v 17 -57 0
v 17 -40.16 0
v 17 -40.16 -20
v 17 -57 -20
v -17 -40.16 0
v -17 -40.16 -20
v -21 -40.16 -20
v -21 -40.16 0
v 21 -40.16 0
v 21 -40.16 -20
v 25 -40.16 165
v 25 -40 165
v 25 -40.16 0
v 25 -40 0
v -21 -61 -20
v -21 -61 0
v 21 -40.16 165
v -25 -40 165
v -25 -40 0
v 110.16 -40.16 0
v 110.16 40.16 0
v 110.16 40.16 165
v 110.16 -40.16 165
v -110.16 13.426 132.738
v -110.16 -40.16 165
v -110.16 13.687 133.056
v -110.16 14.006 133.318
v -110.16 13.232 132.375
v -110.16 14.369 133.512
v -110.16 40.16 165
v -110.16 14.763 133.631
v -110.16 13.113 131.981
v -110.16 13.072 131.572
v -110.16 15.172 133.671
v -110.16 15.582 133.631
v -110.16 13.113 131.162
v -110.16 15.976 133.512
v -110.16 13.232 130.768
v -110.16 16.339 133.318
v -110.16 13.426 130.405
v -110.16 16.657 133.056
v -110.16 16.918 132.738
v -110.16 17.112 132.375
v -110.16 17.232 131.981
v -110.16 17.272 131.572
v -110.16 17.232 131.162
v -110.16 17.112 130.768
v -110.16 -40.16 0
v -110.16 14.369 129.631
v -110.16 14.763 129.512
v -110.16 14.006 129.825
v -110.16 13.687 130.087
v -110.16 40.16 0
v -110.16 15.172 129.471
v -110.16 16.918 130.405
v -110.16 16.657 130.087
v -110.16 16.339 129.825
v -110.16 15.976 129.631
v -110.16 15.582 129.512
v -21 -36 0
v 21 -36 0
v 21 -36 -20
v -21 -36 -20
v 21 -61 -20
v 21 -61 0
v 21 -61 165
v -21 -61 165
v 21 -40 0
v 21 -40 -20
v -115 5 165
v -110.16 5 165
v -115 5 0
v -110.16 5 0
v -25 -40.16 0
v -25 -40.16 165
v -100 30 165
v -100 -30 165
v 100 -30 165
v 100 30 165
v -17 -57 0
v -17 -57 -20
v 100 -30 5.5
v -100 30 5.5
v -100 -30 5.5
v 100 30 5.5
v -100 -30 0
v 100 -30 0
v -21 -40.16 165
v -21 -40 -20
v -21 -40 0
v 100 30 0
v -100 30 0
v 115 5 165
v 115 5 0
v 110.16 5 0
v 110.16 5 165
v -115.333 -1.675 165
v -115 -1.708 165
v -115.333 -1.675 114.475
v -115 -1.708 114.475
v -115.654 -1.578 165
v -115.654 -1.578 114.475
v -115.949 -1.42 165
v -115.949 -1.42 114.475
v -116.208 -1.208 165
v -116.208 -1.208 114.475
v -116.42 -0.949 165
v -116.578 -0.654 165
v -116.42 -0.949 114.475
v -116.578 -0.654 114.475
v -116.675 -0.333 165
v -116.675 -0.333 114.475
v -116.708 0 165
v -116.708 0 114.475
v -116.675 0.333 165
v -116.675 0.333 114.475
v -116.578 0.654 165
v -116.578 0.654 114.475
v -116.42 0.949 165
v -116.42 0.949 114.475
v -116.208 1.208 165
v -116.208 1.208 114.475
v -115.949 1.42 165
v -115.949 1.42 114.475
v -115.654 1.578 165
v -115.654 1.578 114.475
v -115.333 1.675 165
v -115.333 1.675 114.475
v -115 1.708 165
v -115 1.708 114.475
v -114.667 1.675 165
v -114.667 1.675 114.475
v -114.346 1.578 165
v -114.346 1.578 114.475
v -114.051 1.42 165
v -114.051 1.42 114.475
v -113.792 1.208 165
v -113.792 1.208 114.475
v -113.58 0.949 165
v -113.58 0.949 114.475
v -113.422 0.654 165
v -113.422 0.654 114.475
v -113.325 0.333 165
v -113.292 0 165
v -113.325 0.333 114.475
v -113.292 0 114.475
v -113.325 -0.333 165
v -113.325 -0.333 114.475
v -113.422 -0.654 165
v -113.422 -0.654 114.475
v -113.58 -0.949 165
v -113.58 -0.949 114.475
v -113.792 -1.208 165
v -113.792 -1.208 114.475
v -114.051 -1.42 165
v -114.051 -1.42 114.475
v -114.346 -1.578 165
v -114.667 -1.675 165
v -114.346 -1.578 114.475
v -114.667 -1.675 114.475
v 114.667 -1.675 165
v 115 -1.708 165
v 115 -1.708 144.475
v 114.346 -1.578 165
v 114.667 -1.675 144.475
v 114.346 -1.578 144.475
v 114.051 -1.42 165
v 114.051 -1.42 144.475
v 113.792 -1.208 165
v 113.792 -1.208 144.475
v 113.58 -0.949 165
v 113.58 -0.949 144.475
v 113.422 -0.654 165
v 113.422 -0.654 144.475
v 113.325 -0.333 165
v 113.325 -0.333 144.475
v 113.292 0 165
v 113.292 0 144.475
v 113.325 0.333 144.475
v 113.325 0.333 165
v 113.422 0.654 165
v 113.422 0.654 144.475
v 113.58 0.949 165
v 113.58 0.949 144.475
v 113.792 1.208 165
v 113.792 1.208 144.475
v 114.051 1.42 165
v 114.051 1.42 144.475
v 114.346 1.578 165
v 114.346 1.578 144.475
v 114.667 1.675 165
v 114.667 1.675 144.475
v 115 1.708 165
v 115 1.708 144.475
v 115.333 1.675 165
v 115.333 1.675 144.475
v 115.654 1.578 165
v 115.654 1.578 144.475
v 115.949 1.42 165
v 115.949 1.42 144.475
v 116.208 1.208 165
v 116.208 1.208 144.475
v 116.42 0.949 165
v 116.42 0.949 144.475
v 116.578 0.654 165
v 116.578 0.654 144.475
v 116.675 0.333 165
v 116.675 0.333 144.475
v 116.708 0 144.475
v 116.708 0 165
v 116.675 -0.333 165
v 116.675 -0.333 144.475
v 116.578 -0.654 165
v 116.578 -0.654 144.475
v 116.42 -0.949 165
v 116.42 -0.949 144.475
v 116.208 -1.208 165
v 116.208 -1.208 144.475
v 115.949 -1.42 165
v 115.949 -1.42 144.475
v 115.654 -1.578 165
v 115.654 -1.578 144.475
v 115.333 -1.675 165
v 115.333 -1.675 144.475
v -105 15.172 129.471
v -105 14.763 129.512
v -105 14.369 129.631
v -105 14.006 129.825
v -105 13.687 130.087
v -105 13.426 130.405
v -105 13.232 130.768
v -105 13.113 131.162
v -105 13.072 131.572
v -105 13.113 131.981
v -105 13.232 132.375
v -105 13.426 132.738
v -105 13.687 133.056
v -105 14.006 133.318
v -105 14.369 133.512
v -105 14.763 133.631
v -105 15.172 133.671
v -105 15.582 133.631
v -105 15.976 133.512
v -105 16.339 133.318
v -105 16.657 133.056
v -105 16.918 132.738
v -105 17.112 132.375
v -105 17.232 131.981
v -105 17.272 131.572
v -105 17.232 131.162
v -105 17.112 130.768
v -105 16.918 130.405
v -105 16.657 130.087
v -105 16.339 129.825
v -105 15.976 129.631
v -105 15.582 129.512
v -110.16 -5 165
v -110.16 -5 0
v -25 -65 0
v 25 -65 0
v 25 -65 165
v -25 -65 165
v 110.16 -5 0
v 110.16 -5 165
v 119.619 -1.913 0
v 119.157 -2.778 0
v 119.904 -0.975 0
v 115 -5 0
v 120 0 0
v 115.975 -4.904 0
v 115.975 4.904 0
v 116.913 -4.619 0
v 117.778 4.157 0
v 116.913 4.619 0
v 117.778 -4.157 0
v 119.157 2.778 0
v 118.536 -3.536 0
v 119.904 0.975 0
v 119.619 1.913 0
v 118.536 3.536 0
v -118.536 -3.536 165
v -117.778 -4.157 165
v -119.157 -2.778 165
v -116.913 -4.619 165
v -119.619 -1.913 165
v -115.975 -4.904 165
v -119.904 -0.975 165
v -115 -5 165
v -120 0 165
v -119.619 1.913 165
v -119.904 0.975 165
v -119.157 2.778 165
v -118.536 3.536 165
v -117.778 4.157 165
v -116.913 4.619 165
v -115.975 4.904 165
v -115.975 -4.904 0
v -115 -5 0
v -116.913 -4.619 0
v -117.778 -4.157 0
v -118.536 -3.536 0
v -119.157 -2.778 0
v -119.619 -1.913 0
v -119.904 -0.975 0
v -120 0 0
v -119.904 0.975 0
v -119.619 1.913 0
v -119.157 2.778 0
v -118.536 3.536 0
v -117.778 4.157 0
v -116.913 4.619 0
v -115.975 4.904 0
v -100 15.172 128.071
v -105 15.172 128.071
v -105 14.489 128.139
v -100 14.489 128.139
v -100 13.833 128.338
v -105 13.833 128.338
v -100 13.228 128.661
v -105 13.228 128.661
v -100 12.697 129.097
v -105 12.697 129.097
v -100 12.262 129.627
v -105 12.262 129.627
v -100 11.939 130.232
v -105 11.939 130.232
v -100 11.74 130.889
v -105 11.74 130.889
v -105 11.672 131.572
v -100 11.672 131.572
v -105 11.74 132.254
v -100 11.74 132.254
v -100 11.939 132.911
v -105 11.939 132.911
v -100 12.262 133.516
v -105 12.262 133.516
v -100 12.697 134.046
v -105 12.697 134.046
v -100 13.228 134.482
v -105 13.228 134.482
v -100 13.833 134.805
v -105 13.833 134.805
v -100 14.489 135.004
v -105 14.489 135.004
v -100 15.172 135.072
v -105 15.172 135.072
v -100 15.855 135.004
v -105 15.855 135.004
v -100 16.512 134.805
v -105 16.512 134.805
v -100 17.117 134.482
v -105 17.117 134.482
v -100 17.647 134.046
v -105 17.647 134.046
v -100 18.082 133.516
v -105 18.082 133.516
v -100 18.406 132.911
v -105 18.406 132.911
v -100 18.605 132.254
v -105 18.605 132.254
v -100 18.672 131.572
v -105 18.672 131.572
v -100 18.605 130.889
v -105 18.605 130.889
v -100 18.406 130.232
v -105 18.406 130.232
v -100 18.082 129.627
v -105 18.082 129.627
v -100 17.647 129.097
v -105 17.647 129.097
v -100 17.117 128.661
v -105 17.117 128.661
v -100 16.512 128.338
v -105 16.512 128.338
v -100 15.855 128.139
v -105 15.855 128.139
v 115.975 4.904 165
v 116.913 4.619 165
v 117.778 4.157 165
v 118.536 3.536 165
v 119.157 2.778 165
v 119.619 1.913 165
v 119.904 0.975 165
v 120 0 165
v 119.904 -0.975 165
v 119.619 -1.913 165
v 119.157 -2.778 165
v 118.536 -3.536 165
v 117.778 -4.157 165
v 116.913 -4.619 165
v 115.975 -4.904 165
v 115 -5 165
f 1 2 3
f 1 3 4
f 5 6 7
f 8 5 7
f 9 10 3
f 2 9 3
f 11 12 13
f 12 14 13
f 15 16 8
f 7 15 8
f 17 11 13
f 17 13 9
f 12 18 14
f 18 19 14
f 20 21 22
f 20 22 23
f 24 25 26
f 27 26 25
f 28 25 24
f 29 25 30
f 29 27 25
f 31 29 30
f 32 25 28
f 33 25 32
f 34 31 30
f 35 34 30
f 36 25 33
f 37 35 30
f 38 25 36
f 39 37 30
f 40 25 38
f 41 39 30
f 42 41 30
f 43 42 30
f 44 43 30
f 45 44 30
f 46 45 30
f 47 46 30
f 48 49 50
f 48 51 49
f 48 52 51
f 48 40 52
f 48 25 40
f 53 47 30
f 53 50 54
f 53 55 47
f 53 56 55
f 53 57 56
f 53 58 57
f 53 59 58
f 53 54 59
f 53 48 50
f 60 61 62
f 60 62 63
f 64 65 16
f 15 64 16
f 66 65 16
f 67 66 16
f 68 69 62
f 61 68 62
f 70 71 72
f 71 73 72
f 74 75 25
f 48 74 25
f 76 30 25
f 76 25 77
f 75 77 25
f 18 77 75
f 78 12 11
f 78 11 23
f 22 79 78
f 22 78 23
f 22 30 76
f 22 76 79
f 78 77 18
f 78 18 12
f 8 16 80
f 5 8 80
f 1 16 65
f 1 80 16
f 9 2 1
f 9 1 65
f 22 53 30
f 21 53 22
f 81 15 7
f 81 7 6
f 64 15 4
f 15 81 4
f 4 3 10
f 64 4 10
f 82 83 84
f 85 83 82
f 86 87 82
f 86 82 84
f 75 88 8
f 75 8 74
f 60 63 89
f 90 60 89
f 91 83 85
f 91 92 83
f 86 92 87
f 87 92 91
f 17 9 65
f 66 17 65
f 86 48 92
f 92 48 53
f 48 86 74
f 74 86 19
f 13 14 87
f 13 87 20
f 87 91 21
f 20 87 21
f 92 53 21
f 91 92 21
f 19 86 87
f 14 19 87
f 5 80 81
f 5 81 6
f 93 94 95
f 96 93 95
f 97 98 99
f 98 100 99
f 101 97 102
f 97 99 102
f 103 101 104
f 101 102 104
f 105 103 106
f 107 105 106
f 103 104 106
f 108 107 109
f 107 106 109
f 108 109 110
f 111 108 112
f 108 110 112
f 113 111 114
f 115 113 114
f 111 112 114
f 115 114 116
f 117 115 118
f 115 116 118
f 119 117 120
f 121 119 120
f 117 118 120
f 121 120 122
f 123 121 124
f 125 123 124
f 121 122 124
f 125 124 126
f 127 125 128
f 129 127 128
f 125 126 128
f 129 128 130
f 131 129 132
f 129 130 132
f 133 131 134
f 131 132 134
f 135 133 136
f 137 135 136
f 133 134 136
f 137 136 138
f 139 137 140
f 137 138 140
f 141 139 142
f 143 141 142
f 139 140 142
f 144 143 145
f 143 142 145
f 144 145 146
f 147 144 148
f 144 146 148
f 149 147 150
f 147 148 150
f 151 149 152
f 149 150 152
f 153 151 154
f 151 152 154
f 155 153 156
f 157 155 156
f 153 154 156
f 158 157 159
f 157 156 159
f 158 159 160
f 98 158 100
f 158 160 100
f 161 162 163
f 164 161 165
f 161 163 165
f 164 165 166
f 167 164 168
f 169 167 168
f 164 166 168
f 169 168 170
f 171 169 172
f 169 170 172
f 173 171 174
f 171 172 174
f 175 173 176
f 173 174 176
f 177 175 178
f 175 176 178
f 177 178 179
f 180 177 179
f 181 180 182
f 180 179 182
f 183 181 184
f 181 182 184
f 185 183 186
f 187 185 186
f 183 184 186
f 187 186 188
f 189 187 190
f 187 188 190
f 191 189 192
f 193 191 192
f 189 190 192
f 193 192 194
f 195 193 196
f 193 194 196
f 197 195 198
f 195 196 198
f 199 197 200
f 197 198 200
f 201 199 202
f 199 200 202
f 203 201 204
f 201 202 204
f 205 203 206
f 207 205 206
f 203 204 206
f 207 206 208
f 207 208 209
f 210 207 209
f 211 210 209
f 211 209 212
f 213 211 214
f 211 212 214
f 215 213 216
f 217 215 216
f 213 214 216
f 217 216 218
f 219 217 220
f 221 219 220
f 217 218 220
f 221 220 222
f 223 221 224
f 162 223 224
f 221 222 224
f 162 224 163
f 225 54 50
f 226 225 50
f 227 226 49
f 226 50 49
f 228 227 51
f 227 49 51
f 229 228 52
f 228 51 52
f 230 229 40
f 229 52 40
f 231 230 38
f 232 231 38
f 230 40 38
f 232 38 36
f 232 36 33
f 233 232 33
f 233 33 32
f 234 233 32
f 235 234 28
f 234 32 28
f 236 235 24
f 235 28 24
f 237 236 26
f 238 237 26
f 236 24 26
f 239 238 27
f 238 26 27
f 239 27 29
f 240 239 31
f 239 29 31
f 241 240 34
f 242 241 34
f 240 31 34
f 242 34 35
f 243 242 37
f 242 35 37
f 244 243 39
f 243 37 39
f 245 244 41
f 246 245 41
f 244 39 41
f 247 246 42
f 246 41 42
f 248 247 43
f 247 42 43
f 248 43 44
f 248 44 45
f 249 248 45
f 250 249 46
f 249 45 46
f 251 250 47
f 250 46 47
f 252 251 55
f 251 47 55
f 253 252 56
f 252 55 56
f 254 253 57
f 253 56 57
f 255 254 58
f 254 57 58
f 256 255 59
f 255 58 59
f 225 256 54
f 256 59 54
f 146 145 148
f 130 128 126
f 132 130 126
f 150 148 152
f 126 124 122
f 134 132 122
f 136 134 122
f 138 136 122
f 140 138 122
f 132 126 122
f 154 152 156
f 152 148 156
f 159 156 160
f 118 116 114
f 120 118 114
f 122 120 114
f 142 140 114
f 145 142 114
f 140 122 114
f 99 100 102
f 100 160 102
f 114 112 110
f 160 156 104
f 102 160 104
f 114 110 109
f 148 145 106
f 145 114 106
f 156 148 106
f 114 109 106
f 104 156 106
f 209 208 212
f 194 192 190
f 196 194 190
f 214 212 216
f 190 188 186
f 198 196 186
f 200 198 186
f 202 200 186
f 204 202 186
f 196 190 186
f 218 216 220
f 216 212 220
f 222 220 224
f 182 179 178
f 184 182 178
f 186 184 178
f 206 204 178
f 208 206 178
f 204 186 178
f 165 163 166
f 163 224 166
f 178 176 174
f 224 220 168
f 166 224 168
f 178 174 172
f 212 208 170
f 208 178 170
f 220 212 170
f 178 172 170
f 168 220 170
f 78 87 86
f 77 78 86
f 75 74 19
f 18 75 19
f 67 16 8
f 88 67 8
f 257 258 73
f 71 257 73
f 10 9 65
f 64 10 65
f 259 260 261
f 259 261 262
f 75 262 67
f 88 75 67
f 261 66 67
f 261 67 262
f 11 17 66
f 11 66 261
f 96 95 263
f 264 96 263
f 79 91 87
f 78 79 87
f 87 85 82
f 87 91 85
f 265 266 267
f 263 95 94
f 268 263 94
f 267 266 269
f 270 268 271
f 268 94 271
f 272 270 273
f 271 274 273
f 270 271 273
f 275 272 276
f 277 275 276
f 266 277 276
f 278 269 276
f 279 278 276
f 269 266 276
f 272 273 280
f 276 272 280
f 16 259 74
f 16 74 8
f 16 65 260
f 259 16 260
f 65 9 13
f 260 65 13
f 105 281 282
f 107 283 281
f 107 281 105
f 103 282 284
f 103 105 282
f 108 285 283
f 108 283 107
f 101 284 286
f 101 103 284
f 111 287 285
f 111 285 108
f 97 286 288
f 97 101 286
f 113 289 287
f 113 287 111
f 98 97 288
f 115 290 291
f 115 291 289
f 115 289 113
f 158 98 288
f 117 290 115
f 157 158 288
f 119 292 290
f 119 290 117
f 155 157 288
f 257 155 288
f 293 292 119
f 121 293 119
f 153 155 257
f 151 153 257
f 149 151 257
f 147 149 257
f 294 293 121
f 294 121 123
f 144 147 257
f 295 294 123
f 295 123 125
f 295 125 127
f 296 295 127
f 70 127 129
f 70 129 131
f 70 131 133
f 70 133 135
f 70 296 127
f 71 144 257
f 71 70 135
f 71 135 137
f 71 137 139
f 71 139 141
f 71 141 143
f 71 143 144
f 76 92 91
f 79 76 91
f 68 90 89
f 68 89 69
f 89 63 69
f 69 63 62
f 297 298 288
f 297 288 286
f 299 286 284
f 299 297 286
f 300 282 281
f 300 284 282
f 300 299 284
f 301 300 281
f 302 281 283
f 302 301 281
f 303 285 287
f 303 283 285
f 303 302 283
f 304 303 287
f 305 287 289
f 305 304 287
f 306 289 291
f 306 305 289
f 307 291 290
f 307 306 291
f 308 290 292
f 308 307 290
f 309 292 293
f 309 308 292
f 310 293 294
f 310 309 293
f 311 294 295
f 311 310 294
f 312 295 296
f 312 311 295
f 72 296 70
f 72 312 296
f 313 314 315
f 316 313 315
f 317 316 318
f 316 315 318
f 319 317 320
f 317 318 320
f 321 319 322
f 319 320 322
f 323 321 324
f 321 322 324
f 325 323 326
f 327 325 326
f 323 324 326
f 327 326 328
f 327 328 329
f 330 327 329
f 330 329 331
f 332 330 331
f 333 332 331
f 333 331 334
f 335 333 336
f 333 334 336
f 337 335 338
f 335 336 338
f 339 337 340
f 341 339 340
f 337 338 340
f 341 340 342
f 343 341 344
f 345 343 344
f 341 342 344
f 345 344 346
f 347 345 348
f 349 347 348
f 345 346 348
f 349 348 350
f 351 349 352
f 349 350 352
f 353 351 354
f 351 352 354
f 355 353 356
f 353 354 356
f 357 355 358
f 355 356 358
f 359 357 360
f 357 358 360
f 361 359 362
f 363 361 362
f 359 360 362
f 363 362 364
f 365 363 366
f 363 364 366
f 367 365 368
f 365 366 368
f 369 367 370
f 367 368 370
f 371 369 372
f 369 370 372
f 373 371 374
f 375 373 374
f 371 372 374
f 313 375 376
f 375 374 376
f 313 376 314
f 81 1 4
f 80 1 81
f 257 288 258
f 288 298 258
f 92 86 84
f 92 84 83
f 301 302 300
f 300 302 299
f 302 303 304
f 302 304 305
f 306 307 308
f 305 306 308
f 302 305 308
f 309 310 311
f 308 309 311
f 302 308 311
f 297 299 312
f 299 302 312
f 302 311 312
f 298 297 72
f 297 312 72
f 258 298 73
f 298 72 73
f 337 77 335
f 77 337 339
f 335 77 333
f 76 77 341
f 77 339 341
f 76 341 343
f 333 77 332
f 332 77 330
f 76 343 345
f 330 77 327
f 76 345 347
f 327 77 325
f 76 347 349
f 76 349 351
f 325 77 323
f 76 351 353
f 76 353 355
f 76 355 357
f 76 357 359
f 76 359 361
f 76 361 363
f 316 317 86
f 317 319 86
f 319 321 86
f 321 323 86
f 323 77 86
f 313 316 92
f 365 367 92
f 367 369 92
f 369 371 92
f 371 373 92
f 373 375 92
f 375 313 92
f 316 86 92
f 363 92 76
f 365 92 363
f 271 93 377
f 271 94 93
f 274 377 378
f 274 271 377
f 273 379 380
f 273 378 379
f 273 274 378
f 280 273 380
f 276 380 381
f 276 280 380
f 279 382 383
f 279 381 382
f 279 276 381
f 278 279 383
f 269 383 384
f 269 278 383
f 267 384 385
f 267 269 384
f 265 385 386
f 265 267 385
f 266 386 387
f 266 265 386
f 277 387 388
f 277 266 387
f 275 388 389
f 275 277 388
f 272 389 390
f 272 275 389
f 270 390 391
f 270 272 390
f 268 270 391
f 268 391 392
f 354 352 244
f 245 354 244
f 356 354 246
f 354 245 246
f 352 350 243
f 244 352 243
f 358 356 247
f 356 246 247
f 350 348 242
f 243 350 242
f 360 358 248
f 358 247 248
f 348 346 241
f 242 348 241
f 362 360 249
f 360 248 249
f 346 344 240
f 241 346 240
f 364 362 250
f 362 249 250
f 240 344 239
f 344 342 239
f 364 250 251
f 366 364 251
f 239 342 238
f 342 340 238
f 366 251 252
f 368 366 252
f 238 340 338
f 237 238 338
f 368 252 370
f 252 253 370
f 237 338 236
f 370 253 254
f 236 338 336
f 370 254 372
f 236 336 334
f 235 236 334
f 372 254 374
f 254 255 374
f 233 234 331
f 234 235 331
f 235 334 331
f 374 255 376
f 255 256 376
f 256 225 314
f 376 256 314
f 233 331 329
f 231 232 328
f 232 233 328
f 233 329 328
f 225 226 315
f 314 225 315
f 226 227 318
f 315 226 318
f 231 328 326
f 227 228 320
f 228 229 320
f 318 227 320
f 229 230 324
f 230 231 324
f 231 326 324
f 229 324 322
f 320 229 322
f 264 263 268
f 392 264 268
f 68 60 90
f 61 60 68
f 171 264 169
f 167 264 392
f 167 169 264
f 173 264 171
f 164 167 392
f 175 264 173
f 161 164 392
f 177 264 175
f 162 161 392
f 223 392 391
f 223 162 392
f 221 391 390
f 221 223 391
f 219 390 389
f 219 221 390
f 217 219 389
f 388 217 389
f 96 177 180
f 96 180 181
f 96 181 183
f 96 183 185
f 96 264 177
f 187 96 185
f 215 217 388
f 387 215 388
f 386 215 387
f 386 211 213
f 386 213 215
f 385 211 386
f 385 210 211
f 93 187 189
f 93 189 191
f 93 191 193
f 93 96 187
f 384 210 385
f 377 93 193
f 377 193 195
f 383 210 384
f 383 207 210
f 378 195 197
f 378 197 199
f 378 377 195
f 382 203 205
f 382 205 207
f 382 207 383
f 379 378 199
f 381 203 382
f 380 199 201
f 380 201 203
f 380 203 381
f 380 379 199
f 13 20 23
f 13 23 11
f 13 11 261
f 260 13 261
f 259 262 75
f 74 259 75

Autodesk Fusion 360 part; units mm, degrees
sketch "Sketch1" plane through (0, 0, 0) normal (0, 0, 1) x (1, 0, 0) in component "Battery Box"
  line L0 (100, -30) -> (-100, -30)
  line L1 (-100, -30) -> (-100, 30)
  line L2 (-100, 30) -> (100, 30)
  line L3 (100, 30) -> (100, -30)
  line L4 (100, -30) -> (-100, 30) construction
  line L5 (-100, -30) -> (100, 30) construction
  line L6 (110.16, -40.16) -> (-110.16, -40.16)
  line L7 (-110.16, -40.16) -> (-110.16, 40.16)
  line L8 (-110.16, 40.16) -> (110.16, 40.16)
  line L9 (110.16, 40.16) -> (110.16, -40.16)
  line L10 (0, 0) -> (25, 0)
  line L11 (25, 0) -> (25, -40)
  line L12 (0, 0) -> (-25, 0)
  line L13 (-25, 0) -> (-25, -40)
  line L14 (-25, -40) -> (25, -40)
  line L15 (25, -40) -> (25, -65)
  line L16 (25, -65) -> (-25, -65)
  line L17 (-25, -65) -> (-25, -40)
  line L18 (21, -40) -> (21, -61)
  line L19 (21, -61) -> (-21, -61)
  line L20 (-21, -61) -> (-21, -40)
  line L21 (105, -5) -> (115, -5)
  arc A0 (115, -5) -> (115, 5) centre (115, 0) ccw
  line L22 (115, 5) -> (105, 5)
  arc A1 (105, 5) -> (105, -5) centre (105, 0) ccw
  line L23 (105, 0) -> (115, 0) construction
  line L24 (-105, 5) -> (-115, 5)
  arc A2 (-115, 5) -> (-115, -5) centre (-115, 0) ccw
  line L25 (-115, -5) -> (-105, -5)
  arc A3 (-105, -5) -> (-105, 5) centre (-105, 0) ccw
  line L26 (-105, 0) -> (-115, 0) construction
  line L27 (17, -40) -> (17, -57)
  line L28 (17, -57) -> (-17, -57)
  line L29 (-17, -57) -> (-17, -40)
  line L30 (21, -40) -> (21, -36)
  line L31 (21, -36) -> (-21, -36)
  line L32 (-21, -36) -> (-21, -40)
  dimension "d1" = 200
  dimension "d2" = 60
  dimension "d3" = -10.16
  dimension "d4" = 25
  dimension "d5" = 40
  dimension "d6" = 25
  dimension "d7" = 40
  dimension "d8" = 50
  dimension "d9" = 25
  dimension "d10" = 4
  dimension "d11" = 5
  dimension "d12" = 90
  dimension "d13" = 8
  dimension "d22" = 36
extrude "Extrude1" add sketch "Sketch1" along normal blind 165 contours L0 L3 L6 L9 L11 L15 L21 A1 | L0 L11 L13 L14 L30 L31 L32 | L1 L2 L3 L7 L8 L9 L22 A1 L24 A3 | L9 L21 L22 A1 | L0 L1 L6 L7 L13 L17 L25 A3 | L14 L30 L31 L32 | L6 L15 L16 L17 L18 L19 L20 | L7 L24 L25 A3 makes body 1 at (-36.72, 40.16, 110) in component "Battery Box"
extrude "Extrude2" add sketch "Sketch1" along normal blind 5.5 separate body contours L0 L1 L2 L3 L10 L11 L12 L13 | L0 L10 L11 L12 L13 makes body 2 in component "Battery Box"
extrude "Extrude3" add sketch "Sketch1" along normal up to surface (165 mm away) separate body contours L9 L21 A0 L22 | L7 L24 A2 L25 makes body 3 at (116.9422, -4.6074, 110) makes body 4 at (-116.9422, -4.6074, 110) in component "Battery Box"
extrude "Extrude4" add sketch "Sketch1" against normal blind 20 separate body contours L14 L30 L31 L32 | L6 L18 L19 L20 L27 L28 L29 makes body 5 at (7, -61, -6.6667) makes body 6 at (7, -36, -13.3333) in component "Battery Box"
hole "Hole1" at (-115, 0, 165) direction (0, 0, -1) diameter 3.416 depth 50.525 tip angle 180 bodies 4 in component "Battery Box"
hole "Hole2" at (115, 0, 165) direction (0, 0, -1) diameter 3.416 depth 20.525 tip angle 180 bodies 3 in component "Battery Box"
hole "Hole3" at (-100, 15.1723, 131.5715) direction (-1, 0, 0) diameter 4.2 depth 30 tip angle 180 counterbore diameter 7 counterbore depth 5 bodies 1 in component "Battery Box"
component "Battery Box" placed x (1, 0, 0) y (0, 1, 0) z (0, 0, 1) at (0, 0, 0)
